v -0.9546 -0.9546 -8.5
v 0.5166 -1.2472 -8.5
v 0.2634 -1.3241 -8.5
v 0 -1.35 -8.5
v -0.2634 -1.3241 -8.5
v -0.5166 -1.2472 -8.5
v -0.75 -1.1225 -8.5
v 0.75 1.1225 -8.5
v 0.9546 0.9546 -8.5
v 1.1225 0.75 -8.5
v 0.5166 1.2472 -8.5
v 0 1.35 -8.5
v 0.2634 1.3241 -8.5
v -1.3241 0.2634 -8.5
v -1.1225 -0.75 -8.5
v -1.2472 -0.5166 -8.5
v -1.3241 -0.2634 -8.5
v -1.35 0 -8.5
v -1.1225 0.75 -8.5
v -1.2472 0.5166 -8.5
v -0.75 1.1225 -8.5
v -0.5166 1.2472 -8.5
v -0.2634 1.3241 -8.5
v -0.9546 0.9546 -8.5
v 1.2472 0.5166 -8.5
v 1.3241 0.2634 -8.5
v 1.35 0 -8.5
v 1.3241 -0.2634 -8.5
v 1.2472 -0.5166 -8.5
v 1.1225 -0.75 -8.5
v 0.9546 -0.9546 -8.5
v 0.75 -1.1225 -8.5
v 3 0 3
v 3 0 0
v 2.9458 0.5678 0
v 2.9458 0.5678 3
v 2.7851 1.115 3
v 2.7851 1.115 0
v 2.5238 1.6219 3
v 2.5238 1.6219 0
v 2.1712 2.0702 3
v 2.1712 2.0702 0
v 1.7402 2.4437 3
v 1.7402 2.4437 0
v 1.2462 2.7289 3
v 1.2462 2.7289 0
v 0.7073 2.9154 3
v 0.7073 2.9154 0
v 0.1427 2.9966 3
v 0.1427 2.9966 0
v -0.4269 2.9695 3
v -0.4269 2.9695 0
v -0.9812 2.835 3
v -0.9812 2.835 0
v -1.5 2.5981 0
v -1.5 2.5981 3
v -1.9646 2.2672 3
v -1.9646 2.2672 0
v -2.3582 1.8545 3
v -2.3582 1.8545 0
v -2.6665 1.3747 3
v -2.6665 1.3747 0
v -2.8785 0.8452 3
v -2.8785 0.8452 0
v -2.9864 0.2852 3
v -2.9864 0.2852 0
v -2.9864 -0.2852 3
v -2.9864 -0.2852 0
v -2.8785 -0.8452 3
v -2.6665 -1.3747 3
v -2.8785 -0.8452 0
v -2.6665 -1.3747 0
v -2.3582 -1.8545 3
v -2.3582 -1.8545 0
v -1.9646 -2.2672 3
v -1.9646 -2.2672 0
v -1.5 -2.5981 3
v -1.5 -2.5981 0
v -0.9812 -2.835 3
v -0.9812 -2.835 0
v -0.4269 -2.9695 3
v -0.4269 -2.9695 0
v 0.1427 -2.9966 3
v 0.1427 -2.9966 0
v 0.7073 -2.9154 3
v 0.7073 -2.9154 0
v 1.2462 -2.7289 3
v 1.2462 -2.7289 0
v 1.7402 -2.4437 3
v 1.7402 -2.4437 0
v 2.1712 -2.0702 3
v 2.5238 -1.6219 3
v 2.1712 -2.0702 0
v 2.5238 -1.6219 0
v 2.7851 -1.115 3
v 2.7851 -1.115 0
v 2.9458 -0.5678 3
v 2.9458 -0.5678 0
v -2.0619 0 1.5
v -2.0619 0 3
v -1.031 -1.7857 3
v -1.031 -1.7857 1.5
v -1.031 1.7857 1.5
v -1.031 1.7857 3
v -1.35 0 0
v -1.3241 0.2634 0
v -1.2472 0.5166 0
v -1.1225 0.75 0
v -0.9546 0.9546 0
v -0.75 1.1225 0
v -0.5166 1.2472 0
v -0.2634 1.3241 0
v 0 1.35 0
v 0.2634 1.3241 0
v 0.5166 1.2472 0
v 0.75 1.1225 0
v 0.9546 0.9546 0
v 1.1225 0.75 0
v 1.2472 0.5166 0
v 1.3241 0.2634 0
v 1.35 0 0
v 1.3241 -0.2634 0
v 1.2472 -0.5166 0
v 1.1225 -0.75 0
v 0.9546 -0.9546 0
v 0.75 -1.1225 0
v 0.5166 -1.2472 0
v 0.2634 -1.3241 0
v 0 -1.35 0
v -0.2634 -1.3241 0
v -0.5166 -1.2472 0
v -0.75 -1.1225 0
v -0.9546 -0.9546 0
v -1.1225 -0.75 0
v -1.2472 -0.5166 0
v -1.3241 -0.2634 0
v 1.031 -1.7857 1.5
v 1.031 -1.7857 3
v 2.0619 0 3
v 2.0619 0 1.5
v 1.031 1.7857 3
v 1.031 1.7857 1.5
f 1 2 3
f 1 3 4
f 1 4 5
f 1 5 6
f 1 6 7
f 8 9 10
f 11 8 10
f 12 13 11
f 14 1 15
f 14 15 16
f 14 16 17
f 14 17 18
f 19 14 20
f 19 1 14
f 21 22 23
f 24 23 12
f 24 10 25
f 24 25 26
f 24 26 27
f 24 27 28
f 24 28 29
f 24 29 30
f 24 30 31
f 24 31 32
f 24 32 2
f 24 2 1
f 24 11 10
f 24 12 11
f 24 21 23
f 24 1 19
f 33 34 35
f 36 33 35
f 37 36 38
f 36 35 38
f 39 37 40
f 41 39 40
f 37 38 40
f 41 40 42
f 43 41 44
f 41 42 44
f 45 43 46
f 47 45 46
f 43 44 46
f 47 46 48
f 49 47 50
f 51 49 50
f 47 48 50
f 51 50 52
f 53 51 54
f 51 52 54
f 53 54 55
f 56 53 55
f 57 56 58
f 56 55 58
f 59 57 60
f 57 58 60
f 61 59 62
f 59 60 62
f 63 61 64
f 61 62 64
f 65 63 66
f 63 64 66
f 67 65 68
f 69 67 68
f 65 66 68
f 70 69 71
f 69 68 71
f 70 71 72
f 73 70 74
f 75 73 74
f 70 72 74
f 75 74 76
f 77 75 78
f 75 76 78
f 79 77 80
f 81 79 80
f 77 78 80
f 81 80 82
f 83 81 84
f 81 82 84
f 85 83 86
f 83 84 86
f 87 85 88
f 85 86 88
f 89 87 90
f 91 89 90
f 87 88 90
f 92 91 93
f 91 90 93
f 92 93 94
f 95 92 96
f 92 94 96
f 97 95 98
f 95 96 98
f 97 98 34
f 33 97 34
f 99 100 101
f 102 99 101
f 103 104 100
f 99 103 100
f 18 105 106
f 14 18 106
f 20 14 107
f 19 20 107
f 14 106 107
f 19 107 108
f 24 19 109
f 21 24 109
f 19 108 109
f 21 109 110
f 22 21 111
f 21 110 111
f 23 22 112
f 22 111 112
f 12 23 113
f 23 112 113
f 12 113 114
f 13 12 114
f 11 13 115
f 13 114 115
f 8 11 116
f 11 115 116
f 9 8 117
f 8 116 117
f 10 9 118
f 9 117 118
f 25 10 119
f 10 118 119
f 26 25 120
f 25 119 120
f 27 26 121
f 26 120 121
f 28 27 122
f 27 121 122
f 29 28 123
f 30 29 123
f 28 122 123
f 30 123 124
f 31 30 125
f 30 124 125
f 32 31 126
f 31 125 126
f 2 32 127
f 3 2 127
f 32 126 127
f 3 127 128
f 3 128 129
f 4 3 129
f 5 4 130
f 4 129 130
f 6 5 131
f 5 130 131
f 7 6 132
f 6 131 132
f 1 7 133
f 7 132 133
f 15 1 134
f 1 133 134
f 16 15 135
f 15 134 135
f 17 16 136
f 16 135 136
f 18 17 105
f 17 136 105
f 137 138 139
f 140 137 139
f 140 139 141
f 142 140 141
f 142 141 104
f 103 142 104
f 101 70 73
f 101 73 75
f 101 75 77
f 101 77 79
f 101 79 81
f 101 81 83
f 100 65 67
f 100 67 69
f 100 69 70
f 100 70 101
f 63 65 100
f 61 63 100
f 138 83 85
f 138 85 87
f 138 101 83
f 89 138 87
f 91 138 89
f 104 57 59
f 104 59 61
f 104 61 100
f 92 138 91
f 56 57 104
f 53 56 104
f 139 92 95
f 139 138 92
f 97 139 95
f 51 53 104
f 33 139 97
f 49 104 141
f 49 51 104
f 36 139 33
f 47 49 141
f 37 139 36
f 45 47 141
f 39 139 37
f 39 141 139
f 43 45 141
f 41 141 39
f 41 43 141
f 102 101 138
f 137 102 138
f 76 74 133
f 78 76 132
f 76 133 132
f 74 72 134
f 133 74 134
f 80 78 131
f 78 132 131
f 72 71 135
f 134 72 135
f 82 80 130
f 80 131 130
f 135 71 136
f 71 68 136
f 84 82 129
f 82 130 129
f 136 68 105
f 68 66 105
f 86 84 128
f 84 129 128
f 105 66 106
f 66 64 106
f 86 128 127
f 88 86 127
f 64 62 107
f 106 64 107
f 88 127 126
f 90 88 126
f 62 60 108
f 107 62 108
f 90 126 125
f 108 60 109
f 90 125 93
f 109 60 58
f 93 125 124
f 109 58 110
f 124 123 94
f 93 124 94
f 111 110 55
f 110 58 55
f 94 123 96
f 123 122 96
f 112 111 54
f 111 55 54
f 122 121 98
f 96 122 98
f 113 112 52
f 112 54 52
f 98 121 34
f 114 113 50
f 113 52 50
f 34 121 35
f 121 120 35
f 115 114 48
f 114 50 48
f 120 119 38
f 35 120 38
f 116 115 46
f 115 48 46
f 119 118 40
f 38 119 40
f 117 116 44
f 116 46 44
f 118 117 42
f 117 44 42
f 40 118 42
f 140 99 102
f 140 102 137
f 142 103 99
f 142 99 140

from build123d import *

# Parameters (mm, degrees)
SKETCH1_R           = 3
BOSS_EXTRUDE1_DEPTH = 3
CUT_EXTRUDE1_DEPTH  = 1.5
SKETCH4_R           = 1.35
BOSS_EXTRUDE2_DEPTH = 8.5


with BuildPart() as part:
    # Sketch1 → Boss-Extrude1 (new body)
    with BuildSketch(Plane.XY):
        Circle(SKETCH1_R)
    extrude(amount=BOSS_EXTRUDE1_DEPTH)

    # Sketch2 → Cut-Extrude1 (cut)
    with BuildSketch(Plane.XY.offset(3)):
        Polygon((2.06190779, 0), (1.030953895, 1.785664527), (-1.030953895, 1.785664527), (-2.06190779, 0), (-1.030953895, -1.785664527), (1.030953895, -1.785664527), align=None)
    extrude(amount=-CUT_EXTRUDE1_DEPTH, mode=Mode.SUBTRACT)

    # Sketch4 → Boss-Extrude2 (add)
    with BuildSketch(Plane(origin=(0, 0, 0), x_dir=(-1, 0, 0), z_dir=(0, 0, -1))):
        Circle(SKETCH4_R)
    extrude(amount=BOSS_EXTRUDE2_DEPTH)


solid = part.part
